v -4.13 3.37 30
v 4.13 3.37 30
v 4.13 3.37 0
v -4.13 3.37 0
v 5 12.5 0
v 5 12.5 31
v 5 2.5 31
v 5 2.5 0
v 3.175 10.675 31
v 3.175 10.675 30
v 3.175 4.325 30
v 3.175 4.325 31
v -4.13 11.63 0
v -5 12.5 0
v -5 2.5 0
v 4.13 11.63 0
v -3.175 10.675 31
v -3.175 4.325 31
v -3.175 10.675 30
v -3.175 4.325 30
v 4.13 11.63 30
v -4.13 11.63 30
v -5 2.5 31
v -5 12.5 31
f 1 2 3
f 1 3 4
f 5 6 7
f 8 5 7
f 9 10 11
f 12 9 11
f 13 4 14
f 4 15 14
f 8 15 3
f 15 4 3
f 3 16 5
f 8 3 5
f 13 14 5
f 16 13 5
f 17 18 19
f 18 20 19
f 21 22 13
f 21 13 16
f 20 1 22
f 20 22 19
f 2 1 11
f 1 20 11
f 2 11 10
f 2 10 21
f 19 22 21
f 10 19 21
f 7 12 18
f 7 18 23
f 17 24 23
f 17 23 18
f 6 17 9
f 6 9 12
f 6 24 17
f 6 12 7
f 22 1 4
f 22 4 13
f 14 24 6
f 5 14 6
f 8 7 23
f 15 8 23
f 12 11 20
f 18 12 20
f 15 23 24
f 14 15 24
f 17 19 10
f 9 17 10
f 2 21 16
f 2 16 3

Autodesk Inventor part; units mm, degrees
ref_plane "YZ Plane" through (0, 0, 0) normal (1, 0, 0) x (0, 1, 0)
ref_plane "XZ Plane" through (0, 0, 0) normal (0, 1, 0) x (-1, 0, 0)
ref_plane "XY Plane" through (0, 0, 0) normal (0, 0, 1) x (1, 0, 0)
sketch "Sketch1" plane through (0, 0, 0) normal (0, 0, 1) x (1, 0, 0)
  line L0 (-5, 12.5) -> (5, 12.5) projected
  line L1 (5, 12.5) -> (5, 2.5) projected
  line L2 (5, 2.5) -> (-5, 2.5) projected
  line L3 (-5, 2.5) -> (-5, 12.5) projected
  line L4 (-6.5, 1) -> (-6.5, 14) projected
  line L5 (6.5, 1) -> (-6.5, 1) projected
  line L6 (6.5, 14) -> (6.5, 1) projected
  line L7 (-6.5, 14) -> (6.5, 14) projected
  line L8 (-5, 2.5) -> (5, 2.5)
  line L9 (5, 2.5) -> (5, 12.5)
  line L10 (5, 12.5) -> (-5, 12.5)
  line L11 (-5, 12.5) -> (-5, 2.5)
  line L12 (4.1303, 3.3697) -> (-4.1303, 3.3697)
  line L13 (-4.1303, 3.3697) -> (-4.1303, 11.6303)
  line L14 (-4.1303, 11.6303) -> (4.1303, 11.6303)
  line L15 (4.1303, 11.6303) -> (4.1303, 3.3697)
  line L16 (-4.1303, 3.3697) -> (4.1303, 11.6303) construction
  point P0 (0, 0)
  point P1 (0, 7.5)
extrude "Extrusion1" add sketch "Sketch1" along normal blind 30 contours L0 L1 L2 L3
sketch "Sketch2" plane through (0, 0, 30) normal (0, 0, 1) x (1, 0, 0)
  line L0 (-5, 2.5) -> (5, 2.5) projected
  line L1 (5, 2.5) -> (5, 12.5) projected
  line L2 (5, 12.5) -> (-5, 12.5) projected
  line L3 (-5, 12.5) -> (-5, 2.5) projected
  line L4 (3.175, 4.325) -> (-3.175, 4.325)
  line L5 (-3.175, 4.325) -> (-3.175, 10.675)
  line L6 (-3.175, 10.675) -> (3.175, 10.675)
  line L7 (3.175, 10.675) -> (3.175, 4.325)
  line L8 (-3.175, 4.325) -> (3.175, 10.675) construction
  point P0 (0, 0)
  point P1 (0, 7.5)
extrude "Extrusion2" add sketch "Sketch2" along normal blind 1
properties part number "arm-seg1"
